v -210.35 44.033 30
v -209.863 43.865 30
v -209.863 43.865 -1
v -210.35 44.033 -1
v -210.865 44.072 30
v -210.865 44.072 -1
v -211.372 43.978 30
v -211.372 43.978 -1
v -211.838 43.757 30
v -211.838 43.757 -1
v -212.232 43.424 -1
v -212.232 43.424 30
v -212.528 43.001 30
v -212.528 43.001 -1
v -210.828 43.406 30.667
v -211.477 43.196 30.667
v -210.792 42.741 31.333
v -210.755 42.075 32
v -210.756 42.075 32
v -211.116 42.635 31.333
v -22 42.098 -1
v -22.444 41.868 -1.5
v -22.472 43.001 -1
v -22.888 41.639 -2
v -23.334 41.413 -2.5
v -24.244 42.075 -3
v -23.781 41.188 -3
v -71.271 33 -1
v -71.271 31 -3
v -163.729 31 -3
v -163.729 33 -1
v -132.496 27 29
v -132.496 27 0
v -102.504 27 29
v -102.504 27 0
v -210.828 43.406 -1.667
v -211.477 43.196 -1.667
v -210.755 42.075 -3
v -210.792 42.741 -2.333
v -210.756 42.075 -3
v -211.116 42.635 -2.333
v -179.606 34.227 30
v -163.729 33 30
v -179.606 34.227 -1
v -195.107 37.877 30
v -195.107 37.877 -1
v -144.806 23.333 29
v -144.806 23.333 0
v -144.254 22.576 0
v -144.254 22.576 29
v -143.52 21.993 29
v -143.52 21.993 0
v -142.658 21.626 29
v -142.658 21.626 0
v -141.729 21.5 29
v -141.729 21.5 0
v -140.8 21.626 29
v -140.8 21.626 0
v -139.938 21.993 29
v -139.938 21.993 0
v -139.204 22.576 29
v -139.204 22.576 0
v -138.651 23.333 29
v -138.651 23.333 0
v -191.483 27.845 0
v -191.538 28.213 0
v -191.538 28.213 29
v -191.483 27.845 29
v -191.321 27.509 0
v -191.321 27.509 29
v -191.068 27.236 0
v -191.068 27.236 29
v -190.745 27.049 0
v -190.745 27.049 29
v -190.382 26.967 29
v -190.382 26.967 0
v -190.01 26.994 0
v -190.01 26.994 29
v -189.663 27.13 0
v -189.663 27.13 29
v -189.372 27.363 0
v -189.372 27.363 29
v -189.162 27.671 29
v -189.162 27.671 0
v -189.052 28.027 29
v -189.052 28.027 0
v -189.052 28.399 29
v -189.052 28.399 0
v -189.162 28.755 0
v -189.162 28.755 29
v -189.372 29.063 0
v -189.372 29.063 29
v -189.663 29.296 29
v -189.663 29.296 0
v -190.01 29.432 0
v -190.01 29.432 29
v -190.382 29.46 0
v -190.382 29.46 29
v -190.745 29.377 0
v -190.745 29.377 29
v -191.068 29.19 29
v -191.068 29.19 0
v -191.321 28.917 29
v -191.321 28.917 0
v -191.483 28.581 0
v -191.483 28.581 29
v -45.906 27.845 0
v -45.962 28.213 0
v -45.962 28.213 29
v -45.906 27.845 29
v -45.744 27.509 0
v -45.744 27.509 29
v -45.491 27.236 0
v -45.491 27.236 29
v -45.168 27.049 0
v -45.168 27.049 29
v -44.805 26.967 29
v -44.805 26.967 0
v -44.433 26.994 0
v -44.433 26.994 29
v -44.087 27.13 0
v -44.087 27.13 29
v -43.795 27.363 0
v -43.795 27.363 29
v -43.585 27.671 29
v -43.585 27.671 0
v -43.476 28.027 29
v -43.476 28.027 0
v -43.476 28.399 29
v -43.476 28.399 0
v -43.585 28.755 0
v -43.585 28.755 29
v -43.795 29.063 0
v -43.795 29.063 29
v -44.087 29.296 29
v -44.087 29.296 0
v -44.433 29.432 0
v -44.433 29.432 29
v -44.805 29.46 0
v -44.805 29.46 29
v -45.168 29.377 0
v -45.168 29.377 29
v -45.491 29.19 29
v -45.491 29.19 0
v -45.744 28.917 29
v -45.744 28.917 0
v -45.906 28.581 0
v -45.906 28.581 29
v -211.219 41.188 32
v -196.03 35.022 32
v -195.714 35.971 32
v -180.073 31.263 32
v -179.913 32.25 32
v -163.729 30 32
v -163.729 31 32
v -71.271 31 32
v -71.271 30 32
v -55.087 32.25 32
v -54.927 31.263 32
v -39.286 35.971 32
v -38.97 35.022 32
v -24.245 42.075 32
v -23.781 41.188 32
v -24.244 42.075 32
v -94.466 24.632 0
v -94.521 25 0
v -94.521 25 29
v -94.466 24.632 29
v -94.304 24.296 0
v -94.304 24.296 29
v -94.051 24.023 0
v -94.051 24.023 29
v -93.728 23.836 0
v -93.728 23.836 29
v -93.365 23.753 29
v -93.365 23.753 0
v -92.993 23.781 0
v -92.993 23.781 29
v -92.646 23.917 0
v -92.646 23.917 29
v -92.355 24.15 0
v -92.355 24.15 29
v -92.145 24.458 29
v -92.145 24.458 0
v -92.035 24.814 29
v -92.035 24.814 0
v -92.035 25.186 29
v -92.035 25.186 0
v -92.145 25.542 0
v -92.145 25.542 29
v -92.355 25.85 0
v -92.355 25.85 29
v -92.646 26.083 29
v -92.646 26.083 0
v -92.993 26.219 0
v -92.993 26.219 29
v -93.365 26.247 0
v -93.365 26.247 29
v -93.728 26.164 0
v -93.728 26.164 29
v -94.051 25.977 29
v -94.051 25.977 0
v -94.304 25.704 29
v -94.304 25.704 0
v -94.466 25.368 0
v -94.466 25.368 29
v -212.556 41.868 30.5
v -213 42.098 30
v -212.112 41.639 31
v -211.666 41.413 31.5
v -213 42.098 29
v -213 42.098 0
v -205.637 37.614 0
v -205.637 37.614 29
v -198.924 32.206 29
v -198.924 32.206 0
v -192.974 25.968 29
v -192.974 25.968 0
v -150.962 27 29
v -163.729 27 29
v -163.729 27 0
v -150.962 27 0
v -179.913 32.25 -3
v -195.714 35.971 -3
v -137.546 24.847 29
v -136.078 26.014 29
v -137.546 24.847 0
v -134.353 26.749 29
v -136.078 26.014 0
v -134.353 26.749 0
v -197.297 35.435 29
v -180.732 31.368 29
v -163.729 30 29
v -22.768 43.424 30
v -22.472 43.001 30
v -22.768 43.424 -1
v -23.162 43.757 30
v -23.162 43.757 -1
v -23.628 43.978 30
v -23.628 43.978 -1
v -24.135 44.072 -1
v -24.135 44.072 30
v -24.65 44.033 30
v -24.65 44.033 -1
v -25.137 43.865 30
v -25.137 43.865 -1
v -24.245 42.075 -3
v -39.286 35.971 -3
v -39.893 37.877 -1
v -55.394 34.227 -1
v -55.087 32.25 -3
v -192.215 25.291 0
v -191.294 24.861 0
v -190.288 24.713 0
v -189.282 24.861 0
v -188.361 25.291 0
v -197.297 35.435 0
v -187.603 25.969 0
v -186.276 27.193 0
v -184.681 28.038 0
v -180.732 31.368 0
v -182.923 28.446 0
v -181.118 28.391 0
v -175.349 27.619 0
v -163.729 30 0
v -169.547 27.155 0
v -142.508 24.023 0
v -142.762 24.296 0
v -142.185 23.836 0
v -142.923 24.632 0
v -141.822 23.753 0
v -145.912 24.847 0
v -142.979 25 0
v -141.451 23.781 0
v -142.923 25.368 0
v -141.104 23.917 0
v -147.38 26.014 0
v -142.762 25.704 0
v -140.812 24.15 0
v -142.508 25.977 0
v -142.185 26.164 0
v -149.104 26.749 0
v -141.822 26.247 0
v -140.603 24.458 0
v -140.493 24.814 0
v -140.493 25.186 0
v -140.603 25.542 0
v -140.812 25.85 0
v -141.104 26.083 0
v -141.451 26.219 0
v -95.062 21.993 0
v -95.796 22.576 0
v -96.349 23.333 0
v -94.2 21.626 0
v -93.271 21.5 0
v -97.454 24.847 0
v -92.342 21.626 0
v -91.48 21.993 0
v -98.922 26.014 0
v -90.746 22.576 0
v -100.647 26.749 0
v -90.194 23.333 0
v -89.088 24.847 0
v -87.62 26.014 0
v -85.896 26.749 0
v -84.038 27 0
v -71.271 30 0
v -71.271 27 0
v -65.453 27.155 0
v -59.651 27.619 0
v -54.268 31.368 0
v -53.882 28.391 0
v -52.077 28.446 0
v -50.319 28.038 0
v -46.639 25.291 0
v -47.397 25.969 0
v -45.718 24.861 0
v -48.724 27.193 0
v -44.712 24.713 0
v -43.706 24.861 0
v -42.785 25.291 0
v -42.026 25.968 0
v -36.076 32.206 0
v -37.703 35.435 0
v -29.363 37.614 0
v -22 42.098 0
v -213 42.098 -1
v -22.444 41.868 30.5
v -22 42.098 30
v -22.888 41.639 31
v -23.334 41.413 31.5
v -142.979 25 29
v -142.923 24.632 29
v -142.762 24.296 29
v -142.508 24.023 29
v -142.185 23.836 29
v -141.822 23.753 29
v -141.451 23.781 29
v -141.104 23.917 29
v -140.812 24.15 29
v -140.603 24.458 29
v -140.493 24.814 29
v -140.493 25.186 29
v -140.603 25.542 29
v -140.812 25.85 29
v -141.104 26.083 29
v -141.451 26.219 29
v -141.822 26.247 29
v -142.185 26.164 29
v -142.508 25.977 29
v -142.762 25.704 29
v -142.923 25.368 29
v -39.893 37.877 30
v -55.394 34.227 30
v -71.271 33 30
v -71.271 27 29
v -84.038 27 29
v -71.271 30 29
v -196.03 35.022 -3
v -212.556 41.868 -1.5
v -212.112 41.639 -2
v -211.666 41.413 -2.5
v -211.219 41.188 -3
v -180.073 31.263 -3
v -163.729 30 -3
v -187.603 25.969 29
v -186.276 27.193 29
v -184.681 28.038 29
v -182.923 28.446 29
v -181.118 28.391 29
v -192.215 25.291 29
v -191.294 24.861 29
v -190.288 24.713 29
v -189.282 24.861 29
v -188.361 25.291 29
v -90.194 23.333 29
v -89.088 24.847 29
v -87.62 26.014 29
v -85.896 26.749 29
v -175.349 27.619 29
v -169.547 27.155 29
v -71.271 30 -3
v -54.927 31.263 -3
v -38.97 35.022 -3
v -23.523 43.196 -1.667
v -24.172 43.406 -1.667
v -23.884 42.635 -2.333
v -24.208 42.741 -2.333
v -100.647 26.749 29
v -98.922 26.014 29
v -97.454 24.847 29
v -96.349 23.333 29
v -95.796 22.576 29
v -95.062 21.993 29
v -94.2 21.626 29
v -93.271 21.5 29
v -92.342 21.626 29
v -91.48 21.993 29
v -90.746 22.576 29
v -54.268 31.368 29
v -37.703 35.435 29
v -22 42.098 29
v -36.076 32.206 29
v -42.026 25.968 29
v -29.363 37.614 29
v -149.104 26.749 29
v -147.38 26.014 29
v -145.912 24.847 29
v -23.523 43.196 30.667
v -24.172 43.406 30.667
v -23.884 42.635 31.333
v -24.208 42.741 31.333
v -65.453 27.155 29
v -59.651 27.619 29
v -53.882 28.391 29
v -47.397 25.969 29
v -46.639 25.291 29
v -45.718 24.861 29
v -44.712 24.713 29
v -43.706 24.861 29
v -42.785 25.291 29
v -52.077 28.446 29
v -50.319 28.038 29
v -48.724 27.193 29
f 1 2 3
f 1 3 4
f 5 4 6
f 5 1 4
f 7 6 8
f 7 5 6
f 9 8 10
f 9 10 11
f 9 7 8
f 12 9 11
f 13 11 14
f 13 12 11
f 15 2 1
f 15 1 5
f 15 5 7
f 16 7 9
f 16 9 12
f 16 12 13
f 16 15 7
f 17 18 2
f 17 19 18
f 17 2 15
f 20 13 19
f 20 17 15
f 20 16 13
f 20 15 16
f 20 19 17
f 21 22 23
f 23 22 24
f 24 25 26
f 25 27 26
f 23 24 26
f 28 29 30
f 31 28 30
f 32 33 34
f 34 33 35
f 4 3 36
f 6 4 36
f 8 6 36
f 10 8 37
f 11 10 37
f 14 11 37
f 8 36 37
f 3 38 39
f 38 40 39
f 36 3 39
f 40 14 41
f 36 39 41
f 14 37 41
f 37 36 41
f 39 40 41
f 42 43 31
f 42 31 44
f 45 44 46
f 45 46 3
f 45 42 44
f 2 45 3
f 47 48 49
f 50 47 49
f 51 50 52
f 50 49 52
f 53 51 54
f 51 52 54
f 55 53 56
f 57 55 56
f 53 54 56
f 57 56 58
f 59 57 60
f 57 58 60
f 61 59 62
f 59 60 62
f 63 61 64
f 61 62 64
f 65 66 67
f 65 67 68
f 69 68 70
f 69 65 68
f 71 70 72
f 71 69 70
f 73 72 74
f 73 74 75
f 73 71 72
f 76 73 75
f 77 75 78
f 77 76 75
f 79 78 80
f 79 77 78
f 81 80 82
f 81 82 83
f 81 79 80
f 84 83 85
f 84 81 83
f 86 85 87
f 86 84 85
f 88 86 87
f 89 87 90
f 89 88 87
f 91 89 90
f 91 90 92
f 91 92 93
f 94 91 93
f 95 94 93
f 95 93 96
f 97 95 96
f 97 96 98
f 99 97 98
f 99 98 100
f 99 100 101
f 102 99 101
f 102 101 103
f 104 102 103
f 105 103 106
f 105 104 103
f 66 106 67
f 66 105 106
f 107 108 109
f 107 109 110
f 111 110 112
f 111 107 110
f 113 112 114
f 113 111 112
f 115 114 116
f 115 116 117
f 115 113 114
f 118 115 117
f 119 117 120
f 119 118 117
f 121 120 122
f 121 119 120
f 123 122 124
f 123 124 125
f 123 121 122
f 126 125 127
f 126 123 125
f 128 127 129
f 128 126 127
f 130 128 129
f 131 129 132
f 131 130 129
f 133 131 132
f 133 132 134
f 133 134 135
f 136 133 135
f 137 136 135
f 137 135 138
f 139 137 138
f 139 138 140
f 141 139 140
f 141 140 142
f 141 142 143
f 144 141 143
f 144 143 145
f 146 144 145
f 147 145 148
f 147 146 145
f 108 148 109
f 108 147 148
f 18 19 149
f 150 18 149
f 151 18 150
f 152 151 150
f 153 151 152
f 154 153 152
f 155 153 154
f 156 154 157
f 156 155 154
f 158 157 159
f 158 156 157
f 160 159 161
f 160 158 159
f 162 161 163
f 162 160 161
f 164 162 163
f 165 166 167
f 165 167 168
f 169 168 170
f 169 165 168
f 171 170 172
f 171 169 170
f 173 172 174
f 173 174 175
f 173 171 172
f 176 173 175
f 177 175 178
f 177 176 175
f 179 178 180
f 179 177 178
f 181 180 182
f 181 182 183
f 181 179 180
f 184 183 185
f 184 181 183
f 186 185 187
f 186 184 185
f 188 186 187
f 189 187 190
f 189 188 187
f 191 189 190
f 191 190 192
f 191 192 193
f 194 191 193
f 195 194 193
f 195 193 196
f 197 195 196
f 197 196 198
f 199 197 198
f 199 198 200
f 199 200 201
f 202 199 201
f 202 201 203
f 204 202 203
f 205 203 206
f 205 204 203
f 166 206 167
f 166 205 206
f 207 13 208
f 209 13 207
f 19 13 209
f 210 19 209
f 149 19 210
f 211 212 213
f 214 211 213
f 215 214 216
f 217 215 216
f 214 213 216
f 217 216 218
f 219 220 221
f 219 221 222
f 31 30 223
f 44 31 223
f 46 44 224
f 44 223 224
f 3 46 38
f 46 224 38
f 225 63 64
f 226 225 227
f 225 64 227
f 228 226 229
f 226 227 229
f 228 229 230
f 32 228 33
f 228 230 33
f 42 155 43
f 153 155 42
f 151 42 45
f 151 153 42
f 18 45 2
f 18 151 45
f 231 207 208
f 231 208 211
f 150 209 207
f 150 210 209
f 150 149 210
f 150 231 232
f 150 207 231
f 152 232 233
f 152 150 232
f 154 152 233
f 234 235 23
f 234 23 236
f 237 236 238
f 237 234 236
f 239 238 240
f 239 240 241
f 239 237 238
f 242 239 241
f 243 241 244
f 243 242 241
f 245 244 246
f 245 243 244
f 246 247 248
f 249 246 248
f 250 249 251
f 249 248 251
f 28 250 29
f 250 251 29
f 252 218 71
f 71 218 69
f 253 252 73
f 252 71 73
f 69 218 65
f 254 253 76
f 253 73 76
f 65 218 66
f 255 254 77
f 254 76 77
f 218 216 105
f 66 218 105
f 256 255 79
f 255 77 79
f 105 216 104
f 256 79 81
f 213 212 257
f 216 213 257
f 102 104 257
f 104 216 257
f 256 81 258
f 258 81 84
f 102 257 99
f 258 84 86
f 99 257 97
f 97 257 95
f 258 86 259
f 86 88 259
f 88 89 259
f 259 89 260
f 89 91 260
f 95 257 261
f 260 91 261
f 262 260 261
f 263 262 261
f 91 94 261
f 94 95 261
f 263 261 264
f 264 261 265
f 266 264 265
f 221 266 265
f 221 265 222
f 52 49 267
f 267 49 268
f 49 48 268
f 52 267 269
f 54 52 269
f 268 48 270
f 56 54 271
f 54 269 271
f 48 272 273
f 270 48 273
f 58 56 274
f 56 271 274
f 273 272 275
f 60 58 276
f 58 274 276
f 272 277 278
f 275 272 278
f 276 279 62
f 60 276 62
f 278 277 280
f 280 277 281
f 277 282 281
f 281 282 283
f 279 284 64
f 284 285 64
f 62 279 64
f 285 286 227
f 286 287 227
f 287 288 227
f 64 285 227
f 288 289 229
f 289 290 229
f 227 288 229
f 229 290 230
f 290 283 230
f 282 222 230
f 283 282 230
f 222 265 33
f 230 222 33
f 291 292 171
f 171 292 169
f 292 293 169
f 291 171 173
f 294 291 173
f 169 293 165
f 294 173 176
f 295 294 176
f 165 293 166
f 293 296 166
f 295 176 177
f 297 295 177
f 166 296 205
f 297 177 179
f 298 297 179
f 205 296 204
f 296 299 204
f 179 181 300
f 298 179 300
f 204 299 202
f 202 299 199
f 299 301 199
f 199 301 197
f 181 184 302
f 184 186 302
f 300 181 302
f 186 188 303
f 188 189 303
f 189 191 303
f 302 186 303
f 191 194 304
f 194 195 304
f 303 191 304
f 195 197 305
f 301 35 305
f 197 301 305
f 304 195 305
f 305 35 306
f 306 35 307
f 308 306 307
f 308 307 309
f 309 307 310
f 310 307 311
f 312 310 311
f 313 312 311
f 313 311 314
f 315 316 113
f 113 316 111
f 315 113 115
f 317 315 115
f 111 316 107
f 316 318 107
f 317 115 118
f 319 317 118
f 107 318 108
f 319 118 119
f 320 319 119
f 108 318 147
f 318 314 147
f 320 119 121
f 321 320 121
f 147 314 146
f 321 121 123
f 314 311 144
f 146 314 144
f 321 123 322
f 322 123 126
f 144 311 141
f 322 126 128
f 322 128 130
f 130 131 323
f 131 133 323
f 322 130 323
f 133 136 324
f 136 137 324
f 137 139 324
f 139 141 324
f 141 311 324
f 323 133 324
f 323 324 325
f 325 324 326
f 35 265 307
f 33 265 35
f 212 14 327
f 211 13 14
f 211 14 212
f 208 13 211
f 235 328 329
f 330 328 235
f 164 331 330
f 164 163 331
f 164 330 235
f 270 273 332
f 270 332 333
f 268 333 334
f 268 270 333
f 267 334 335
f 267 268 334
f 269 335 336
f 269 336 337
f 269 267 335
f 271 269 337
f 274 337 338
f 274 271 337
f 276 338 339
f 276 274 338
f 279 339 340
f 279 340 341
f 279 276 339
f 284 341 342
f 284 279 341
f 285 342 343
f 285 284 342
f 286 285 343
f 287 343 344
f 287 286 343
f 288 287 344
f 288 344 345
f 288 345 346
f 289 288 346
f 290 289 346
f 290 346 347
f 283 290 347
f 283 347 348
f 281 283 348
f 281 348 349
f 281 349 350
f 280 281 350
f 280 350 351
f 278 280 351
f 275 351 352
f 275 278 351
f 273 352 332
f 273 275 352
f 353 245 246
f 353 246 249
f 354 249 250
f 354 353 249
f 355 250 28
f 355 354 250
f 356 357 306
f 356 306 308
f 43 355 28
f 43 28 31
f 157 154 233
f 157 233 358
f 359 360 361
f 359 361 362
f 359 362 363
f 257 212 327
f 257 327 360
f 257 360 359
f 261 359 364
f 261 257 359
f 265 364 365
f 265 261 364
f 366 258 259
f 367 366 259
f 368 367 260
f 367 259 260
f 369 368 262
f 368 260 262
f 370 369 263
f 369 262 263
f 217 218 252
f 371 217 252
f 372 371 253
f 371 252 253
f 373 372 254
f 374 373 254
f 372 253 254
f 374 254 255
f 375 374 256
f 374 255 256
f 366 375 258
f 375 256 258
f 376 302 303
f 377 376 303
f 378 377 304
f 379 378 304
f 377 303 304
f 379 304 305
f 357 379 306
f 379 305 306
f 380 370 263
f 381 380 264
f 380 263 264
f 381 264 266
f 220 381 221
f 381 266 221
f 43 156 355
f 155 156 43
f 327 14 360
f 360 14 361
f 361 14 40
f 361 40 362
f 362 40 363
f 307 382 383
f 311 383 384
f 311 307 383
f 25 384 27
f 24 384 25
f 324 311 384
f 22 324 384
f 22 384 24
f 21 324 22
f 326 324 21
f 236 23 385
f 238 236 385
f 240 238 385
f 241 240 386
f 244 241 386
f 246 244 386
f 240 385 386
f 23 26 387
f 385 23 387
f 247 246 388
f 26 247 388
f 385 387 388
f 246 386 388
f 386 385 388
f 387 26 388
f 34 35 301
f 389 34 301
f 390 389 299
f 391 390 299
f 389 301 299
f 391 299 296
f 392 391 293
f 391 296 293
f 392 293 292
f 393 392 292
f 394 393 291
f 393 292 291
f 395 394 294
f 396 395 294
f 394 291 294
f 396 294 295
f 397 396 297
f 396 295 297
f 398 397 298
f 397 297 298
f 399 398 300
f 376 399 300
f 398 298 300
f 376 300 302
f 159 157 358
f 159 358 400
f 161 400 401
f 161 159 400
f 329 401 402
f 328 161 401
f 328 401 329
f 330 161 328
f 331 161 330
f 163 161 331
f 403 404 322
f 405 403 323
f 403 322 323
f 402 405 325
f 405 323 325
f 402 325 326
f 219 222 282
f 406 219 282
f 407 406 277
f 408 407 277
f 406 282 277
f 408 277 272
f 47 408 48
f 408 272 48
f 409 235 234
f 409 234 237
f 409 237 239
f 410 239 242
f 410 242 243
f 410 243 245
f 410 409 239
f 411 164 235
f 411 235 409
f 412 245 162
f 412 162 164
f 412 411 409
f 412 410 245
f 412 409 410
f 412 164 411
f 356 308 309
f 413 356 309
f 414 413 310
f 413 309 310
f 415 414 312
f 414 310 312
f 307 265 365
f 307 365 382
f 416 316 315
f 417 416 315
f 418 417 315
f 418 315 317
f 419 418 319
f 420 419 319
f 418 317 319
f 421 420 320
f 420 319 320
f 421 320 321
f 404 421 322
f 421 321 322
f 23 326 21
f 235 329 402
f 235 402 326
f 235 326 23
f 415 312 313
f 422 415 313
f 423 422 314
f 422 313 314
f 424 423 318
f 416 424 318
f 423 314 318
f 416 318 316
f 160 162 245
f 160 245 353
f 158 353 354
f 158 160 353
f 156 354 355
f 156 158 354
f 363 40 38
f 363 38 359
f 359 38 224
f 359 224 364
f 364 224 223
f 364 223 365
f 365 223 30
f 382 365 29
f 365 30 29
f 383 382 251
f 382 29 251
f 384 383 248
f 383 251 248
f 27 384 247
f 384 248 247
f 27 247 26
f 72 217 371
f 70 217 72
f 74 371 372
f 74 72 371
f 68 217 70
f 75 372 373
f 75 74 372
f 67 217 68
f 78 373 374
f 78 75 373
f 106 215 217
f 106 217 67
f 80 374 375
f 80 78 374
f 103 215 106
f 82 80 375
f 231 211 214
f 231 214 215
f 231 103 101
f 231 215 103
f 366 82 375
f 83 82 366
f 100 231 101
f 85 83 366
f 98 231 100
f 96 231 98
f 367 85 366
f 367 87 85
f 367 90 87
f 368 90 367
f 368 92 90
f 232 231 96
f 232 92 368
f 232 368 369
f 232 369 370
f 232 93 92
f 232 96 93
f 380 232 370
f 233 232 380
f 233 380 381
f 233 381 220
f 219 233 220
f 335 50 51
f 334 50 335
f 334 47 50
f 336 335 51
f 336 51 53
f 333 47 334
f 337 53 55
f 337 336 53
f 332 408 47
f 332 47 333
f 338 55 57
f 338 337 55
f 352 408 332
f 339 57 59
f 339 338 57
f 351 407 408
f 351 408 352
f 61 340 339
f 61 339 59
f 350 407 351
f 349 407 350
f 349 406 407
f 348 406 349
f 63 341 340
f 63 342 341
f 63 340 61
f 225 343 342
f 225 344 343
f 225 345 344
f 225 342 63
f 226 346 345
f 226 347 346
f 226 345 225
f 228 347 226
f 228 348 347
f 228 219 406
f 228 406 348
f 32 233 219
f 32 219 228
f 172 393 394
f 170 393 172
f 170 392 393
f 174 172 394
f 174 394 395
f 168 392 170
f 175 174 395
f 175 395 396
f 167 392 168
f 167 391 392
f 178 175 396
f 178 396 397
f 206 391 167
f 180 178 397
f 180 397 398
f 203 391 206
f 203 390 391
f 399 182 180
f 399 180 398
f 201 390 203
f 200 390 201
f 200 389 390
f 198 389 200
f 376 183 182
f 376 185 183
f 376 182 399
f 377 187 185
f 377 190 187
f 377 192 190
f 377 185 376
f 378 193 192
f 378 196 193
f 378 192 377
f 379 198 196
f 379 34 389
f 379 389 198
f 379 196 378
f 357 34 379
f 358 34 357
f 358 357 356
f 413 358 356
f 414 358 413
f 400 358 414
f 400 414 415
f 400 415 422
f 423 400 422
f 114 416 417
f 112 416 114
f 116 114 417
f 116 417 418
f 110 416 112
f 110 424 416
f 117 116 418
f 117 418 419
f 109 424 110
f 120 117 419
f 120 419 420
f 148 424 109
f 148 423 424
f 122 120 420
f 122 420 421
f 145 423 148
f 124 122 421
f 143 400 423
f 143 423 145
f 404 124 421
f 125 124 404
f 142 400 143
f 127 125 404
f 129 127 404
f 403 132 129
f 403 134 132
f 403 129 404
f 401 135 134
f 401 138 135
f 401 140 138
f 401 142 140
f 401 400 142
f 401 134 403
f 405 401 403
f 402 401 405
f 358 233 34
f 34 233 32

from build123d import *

# Parameters (mm, degrees)
SKETCH_1_R           = 1.25
EXTRUDE_1_DEPTH      = 29
EXTRUDE_2_DEPTH      = 3
EXTRUDE_2_DEPTH_BACK = 32
CHAMFER_1_SIZE       = 2


with BuildPart() as part:
    # 草图1 → 凸台-拉伸1 (new body)
    with BuildSketch(Plane.XY):
        with BuildLine():
            Line((-71.271215686, 33), (-163.728784314, 33))
            ThreePointArc((-163.728784314, 33), (-187.426920576, 35.752824596), (-209.86299145, 43.864694254))
            ThreePointArc((-209.86299145, 43.864694254), (-211.371961919, 43.977504611), (-212.528051157, 43.001197422))
            Line((-212.528051157, 43.001197422), (-213, 42.09809972))
            ThreePointArc((-213, 42.09809972), (-202.192009237, 35.020119991), (-192.973824319, 25.968295413))
            ThreePointArc((-192.973824319, 25.968295413), (-190.288164523, 24.71302347), (-187.602714776, 25.968744715))
            ThreePointArc((-187.602714776, 25.968744715), (-184.680917301, 28.037551849), (-181.118358374, 28.391158027))
            ThreePointArc((-181.118358374, 28.391158027), (-172.451349972, 27.34834419), (-163.728784314, 27))
            Line((-163.728784314, 27), (-150.96187697, 27))
            ThreePointArc((-150.96187697, 27), (-147.37951276, 26.013872851), (-144.806481866, 23.333333333))
            ThreePointArc((-144.806481866, 23.333333333), (-141.728784314, 21.5), (-138.651086762, 23.333333333))
            ThreePointArc((-138.651086762, 23.333333333), (-136.078055868, 26.013872851), (-132.495691658, 27))
            Line((-132.495691658, 27), (-102.504308342, 27))
            ThreePointArc((-102.504308342, 27), (-98.921944132, 26.013872851), (-96.348913238, 23.333333333))
            ThreePointArc((-96.348913238, 23.333333333), (-93.271215686, 21.5), (-90.193518134, 23.333333333))
            ThreePointArc((-90.193518134, 23.333333333), (-87.62048724, 26.013872851), (-84.03812303, 27))
            Line((-84.03812303, 27), (-71.271215686, 27))
            ThreePointArc((-71.271215686, 27), (-62.548650028, 27.34834419), (-53.881641626, 28.391158027))
            ThreePointArc((-53.881641626, 28.391158027), (-50.319082699, 28.037551849), (-47.397285224, 25.968744715))
            ThreePointArc((-47.397285224, 25.968744715), (-44.711835477, 24.71302347), (-42.026175681, 25.968295413))
            ThreePointArc((-42.026175681, 25.968295413), (-32.807990763, 35.020119991), (-22, 42.09809972))
            Line((-22, 42.09809972), (-22.471948843, 43.001197422))
            ThreePointArc((-22.471948843, 43.001197422), (-23.628038081, 43.977504611), (-25.13700855, 43.864694254))
            ThreePointArc((-25.13700855, 43.864694254), (-47.573079424, 35.752824596), (-71.271215686, 33))
        make_face()
        with Locations(Location((-44.711542697, 28.213023457, 0), (0, 0, 180))):
            Circle(SKETCH_1_R, mode=Mode.SUBTRACT)
        with Locations(Location((-93.271215686, 25, 0), (0, 0, 180))):
            Circle(SKETCH_1_R, mode=Mode.SUBTRACT)
        with Locations(Location((-141.728784314, 25, 0), (0, 0, 180))):
            Circle(SKETCH_1_R, mode=Mode.SUBTRACT)
        with Locations(Location((-190.288457303, 28.213023457, 0), (0, 0, 180))):
            Circle(SKETCH_1_R, mode=Mode.SUBTRACT)
    extrude(amount=EXTRUDE_1_DEPTH)

    # 草图2 → 凸台-拉伸2 (add, two sides: drawn at the far end of the back side and taken through both)
    with BuildSketch(Plane(origin=(0, 0, 0), x_dir=(-1, 0, 0), z_dir=(0, 0, -1)).offset(-EXTRUDE_2_DEPTH_BACK)):
        with BuildLine():
            Line((163.728784314, 30), (71.271215686, 30))
            ThreePointArc((71.271215686, 30), (45.903831548, 33.068787794), (22, 42.09809972))
            Line((22, 42.09809972), (22.471948843, 43.001197422))
            ThreePointArc((22.471948843, 43.001197422), (23.628038081, 43.977504611), (25.13700855, 43.864694254))
            ThreePointArc((25.13700855, 43.864694254), (47.573079424, 35.752824596), (71.271215686, 33))
            Line((71.271215686, 33), (163.728784314, 33))
            ThreePointArc((163.728784314, 33), (187.426920576, 35.752824596), (209.86299145, 43.864694254))
            ThreePointArc((209.86299145, 43.864694254), (211.371961919, 43.977504611), (212.528051157, 43.001197422))
            Line((212.528051157, 43.001197422), (213, 42.09809972))
            ThreePointArc((213, 42.09809972), (189.096168452, 33.068787794), (163.728784314, 30))
        make_face()
    extrude(amount=EXTRUDE_2_DEPTH + EXTRUDE_2_DEPTH_BACK)

    # 倒角1
    chamfer_1_edges = [part.edges().sort_by_distance(p)[0] for p in [
        (-22.235974422, 42.549648571, 32),
        (-23.628038081, 43.977504611, 32),
        (-47.573079424, 35.752824596, 32),
        (-117.5, 33, 32),
        (-187.426920576, 35.752824596, 32),
        (-211.371961919, 43.977504611, 32),
        (-212.764025578, 42.549648571, 32),
        (-212.764025578, 42.549648571, -3),
        (-211.371961919, 43.977504611, -3),
        (-187.426920576, 35.752824596, -3),
        (-117.5, 33, -3),
        (-47.573079424, 35.752824596, -3),
        (-23.628038081, 43.977504611, -3),
        (-22.235974422, 42.549648571, -3),
    ]]
    chamfer(chamfer_1_edges, length=CHAMFER_1_SIZE - 0.0001)  # a hair under: the kernel refuses the full size


solid = part.part
